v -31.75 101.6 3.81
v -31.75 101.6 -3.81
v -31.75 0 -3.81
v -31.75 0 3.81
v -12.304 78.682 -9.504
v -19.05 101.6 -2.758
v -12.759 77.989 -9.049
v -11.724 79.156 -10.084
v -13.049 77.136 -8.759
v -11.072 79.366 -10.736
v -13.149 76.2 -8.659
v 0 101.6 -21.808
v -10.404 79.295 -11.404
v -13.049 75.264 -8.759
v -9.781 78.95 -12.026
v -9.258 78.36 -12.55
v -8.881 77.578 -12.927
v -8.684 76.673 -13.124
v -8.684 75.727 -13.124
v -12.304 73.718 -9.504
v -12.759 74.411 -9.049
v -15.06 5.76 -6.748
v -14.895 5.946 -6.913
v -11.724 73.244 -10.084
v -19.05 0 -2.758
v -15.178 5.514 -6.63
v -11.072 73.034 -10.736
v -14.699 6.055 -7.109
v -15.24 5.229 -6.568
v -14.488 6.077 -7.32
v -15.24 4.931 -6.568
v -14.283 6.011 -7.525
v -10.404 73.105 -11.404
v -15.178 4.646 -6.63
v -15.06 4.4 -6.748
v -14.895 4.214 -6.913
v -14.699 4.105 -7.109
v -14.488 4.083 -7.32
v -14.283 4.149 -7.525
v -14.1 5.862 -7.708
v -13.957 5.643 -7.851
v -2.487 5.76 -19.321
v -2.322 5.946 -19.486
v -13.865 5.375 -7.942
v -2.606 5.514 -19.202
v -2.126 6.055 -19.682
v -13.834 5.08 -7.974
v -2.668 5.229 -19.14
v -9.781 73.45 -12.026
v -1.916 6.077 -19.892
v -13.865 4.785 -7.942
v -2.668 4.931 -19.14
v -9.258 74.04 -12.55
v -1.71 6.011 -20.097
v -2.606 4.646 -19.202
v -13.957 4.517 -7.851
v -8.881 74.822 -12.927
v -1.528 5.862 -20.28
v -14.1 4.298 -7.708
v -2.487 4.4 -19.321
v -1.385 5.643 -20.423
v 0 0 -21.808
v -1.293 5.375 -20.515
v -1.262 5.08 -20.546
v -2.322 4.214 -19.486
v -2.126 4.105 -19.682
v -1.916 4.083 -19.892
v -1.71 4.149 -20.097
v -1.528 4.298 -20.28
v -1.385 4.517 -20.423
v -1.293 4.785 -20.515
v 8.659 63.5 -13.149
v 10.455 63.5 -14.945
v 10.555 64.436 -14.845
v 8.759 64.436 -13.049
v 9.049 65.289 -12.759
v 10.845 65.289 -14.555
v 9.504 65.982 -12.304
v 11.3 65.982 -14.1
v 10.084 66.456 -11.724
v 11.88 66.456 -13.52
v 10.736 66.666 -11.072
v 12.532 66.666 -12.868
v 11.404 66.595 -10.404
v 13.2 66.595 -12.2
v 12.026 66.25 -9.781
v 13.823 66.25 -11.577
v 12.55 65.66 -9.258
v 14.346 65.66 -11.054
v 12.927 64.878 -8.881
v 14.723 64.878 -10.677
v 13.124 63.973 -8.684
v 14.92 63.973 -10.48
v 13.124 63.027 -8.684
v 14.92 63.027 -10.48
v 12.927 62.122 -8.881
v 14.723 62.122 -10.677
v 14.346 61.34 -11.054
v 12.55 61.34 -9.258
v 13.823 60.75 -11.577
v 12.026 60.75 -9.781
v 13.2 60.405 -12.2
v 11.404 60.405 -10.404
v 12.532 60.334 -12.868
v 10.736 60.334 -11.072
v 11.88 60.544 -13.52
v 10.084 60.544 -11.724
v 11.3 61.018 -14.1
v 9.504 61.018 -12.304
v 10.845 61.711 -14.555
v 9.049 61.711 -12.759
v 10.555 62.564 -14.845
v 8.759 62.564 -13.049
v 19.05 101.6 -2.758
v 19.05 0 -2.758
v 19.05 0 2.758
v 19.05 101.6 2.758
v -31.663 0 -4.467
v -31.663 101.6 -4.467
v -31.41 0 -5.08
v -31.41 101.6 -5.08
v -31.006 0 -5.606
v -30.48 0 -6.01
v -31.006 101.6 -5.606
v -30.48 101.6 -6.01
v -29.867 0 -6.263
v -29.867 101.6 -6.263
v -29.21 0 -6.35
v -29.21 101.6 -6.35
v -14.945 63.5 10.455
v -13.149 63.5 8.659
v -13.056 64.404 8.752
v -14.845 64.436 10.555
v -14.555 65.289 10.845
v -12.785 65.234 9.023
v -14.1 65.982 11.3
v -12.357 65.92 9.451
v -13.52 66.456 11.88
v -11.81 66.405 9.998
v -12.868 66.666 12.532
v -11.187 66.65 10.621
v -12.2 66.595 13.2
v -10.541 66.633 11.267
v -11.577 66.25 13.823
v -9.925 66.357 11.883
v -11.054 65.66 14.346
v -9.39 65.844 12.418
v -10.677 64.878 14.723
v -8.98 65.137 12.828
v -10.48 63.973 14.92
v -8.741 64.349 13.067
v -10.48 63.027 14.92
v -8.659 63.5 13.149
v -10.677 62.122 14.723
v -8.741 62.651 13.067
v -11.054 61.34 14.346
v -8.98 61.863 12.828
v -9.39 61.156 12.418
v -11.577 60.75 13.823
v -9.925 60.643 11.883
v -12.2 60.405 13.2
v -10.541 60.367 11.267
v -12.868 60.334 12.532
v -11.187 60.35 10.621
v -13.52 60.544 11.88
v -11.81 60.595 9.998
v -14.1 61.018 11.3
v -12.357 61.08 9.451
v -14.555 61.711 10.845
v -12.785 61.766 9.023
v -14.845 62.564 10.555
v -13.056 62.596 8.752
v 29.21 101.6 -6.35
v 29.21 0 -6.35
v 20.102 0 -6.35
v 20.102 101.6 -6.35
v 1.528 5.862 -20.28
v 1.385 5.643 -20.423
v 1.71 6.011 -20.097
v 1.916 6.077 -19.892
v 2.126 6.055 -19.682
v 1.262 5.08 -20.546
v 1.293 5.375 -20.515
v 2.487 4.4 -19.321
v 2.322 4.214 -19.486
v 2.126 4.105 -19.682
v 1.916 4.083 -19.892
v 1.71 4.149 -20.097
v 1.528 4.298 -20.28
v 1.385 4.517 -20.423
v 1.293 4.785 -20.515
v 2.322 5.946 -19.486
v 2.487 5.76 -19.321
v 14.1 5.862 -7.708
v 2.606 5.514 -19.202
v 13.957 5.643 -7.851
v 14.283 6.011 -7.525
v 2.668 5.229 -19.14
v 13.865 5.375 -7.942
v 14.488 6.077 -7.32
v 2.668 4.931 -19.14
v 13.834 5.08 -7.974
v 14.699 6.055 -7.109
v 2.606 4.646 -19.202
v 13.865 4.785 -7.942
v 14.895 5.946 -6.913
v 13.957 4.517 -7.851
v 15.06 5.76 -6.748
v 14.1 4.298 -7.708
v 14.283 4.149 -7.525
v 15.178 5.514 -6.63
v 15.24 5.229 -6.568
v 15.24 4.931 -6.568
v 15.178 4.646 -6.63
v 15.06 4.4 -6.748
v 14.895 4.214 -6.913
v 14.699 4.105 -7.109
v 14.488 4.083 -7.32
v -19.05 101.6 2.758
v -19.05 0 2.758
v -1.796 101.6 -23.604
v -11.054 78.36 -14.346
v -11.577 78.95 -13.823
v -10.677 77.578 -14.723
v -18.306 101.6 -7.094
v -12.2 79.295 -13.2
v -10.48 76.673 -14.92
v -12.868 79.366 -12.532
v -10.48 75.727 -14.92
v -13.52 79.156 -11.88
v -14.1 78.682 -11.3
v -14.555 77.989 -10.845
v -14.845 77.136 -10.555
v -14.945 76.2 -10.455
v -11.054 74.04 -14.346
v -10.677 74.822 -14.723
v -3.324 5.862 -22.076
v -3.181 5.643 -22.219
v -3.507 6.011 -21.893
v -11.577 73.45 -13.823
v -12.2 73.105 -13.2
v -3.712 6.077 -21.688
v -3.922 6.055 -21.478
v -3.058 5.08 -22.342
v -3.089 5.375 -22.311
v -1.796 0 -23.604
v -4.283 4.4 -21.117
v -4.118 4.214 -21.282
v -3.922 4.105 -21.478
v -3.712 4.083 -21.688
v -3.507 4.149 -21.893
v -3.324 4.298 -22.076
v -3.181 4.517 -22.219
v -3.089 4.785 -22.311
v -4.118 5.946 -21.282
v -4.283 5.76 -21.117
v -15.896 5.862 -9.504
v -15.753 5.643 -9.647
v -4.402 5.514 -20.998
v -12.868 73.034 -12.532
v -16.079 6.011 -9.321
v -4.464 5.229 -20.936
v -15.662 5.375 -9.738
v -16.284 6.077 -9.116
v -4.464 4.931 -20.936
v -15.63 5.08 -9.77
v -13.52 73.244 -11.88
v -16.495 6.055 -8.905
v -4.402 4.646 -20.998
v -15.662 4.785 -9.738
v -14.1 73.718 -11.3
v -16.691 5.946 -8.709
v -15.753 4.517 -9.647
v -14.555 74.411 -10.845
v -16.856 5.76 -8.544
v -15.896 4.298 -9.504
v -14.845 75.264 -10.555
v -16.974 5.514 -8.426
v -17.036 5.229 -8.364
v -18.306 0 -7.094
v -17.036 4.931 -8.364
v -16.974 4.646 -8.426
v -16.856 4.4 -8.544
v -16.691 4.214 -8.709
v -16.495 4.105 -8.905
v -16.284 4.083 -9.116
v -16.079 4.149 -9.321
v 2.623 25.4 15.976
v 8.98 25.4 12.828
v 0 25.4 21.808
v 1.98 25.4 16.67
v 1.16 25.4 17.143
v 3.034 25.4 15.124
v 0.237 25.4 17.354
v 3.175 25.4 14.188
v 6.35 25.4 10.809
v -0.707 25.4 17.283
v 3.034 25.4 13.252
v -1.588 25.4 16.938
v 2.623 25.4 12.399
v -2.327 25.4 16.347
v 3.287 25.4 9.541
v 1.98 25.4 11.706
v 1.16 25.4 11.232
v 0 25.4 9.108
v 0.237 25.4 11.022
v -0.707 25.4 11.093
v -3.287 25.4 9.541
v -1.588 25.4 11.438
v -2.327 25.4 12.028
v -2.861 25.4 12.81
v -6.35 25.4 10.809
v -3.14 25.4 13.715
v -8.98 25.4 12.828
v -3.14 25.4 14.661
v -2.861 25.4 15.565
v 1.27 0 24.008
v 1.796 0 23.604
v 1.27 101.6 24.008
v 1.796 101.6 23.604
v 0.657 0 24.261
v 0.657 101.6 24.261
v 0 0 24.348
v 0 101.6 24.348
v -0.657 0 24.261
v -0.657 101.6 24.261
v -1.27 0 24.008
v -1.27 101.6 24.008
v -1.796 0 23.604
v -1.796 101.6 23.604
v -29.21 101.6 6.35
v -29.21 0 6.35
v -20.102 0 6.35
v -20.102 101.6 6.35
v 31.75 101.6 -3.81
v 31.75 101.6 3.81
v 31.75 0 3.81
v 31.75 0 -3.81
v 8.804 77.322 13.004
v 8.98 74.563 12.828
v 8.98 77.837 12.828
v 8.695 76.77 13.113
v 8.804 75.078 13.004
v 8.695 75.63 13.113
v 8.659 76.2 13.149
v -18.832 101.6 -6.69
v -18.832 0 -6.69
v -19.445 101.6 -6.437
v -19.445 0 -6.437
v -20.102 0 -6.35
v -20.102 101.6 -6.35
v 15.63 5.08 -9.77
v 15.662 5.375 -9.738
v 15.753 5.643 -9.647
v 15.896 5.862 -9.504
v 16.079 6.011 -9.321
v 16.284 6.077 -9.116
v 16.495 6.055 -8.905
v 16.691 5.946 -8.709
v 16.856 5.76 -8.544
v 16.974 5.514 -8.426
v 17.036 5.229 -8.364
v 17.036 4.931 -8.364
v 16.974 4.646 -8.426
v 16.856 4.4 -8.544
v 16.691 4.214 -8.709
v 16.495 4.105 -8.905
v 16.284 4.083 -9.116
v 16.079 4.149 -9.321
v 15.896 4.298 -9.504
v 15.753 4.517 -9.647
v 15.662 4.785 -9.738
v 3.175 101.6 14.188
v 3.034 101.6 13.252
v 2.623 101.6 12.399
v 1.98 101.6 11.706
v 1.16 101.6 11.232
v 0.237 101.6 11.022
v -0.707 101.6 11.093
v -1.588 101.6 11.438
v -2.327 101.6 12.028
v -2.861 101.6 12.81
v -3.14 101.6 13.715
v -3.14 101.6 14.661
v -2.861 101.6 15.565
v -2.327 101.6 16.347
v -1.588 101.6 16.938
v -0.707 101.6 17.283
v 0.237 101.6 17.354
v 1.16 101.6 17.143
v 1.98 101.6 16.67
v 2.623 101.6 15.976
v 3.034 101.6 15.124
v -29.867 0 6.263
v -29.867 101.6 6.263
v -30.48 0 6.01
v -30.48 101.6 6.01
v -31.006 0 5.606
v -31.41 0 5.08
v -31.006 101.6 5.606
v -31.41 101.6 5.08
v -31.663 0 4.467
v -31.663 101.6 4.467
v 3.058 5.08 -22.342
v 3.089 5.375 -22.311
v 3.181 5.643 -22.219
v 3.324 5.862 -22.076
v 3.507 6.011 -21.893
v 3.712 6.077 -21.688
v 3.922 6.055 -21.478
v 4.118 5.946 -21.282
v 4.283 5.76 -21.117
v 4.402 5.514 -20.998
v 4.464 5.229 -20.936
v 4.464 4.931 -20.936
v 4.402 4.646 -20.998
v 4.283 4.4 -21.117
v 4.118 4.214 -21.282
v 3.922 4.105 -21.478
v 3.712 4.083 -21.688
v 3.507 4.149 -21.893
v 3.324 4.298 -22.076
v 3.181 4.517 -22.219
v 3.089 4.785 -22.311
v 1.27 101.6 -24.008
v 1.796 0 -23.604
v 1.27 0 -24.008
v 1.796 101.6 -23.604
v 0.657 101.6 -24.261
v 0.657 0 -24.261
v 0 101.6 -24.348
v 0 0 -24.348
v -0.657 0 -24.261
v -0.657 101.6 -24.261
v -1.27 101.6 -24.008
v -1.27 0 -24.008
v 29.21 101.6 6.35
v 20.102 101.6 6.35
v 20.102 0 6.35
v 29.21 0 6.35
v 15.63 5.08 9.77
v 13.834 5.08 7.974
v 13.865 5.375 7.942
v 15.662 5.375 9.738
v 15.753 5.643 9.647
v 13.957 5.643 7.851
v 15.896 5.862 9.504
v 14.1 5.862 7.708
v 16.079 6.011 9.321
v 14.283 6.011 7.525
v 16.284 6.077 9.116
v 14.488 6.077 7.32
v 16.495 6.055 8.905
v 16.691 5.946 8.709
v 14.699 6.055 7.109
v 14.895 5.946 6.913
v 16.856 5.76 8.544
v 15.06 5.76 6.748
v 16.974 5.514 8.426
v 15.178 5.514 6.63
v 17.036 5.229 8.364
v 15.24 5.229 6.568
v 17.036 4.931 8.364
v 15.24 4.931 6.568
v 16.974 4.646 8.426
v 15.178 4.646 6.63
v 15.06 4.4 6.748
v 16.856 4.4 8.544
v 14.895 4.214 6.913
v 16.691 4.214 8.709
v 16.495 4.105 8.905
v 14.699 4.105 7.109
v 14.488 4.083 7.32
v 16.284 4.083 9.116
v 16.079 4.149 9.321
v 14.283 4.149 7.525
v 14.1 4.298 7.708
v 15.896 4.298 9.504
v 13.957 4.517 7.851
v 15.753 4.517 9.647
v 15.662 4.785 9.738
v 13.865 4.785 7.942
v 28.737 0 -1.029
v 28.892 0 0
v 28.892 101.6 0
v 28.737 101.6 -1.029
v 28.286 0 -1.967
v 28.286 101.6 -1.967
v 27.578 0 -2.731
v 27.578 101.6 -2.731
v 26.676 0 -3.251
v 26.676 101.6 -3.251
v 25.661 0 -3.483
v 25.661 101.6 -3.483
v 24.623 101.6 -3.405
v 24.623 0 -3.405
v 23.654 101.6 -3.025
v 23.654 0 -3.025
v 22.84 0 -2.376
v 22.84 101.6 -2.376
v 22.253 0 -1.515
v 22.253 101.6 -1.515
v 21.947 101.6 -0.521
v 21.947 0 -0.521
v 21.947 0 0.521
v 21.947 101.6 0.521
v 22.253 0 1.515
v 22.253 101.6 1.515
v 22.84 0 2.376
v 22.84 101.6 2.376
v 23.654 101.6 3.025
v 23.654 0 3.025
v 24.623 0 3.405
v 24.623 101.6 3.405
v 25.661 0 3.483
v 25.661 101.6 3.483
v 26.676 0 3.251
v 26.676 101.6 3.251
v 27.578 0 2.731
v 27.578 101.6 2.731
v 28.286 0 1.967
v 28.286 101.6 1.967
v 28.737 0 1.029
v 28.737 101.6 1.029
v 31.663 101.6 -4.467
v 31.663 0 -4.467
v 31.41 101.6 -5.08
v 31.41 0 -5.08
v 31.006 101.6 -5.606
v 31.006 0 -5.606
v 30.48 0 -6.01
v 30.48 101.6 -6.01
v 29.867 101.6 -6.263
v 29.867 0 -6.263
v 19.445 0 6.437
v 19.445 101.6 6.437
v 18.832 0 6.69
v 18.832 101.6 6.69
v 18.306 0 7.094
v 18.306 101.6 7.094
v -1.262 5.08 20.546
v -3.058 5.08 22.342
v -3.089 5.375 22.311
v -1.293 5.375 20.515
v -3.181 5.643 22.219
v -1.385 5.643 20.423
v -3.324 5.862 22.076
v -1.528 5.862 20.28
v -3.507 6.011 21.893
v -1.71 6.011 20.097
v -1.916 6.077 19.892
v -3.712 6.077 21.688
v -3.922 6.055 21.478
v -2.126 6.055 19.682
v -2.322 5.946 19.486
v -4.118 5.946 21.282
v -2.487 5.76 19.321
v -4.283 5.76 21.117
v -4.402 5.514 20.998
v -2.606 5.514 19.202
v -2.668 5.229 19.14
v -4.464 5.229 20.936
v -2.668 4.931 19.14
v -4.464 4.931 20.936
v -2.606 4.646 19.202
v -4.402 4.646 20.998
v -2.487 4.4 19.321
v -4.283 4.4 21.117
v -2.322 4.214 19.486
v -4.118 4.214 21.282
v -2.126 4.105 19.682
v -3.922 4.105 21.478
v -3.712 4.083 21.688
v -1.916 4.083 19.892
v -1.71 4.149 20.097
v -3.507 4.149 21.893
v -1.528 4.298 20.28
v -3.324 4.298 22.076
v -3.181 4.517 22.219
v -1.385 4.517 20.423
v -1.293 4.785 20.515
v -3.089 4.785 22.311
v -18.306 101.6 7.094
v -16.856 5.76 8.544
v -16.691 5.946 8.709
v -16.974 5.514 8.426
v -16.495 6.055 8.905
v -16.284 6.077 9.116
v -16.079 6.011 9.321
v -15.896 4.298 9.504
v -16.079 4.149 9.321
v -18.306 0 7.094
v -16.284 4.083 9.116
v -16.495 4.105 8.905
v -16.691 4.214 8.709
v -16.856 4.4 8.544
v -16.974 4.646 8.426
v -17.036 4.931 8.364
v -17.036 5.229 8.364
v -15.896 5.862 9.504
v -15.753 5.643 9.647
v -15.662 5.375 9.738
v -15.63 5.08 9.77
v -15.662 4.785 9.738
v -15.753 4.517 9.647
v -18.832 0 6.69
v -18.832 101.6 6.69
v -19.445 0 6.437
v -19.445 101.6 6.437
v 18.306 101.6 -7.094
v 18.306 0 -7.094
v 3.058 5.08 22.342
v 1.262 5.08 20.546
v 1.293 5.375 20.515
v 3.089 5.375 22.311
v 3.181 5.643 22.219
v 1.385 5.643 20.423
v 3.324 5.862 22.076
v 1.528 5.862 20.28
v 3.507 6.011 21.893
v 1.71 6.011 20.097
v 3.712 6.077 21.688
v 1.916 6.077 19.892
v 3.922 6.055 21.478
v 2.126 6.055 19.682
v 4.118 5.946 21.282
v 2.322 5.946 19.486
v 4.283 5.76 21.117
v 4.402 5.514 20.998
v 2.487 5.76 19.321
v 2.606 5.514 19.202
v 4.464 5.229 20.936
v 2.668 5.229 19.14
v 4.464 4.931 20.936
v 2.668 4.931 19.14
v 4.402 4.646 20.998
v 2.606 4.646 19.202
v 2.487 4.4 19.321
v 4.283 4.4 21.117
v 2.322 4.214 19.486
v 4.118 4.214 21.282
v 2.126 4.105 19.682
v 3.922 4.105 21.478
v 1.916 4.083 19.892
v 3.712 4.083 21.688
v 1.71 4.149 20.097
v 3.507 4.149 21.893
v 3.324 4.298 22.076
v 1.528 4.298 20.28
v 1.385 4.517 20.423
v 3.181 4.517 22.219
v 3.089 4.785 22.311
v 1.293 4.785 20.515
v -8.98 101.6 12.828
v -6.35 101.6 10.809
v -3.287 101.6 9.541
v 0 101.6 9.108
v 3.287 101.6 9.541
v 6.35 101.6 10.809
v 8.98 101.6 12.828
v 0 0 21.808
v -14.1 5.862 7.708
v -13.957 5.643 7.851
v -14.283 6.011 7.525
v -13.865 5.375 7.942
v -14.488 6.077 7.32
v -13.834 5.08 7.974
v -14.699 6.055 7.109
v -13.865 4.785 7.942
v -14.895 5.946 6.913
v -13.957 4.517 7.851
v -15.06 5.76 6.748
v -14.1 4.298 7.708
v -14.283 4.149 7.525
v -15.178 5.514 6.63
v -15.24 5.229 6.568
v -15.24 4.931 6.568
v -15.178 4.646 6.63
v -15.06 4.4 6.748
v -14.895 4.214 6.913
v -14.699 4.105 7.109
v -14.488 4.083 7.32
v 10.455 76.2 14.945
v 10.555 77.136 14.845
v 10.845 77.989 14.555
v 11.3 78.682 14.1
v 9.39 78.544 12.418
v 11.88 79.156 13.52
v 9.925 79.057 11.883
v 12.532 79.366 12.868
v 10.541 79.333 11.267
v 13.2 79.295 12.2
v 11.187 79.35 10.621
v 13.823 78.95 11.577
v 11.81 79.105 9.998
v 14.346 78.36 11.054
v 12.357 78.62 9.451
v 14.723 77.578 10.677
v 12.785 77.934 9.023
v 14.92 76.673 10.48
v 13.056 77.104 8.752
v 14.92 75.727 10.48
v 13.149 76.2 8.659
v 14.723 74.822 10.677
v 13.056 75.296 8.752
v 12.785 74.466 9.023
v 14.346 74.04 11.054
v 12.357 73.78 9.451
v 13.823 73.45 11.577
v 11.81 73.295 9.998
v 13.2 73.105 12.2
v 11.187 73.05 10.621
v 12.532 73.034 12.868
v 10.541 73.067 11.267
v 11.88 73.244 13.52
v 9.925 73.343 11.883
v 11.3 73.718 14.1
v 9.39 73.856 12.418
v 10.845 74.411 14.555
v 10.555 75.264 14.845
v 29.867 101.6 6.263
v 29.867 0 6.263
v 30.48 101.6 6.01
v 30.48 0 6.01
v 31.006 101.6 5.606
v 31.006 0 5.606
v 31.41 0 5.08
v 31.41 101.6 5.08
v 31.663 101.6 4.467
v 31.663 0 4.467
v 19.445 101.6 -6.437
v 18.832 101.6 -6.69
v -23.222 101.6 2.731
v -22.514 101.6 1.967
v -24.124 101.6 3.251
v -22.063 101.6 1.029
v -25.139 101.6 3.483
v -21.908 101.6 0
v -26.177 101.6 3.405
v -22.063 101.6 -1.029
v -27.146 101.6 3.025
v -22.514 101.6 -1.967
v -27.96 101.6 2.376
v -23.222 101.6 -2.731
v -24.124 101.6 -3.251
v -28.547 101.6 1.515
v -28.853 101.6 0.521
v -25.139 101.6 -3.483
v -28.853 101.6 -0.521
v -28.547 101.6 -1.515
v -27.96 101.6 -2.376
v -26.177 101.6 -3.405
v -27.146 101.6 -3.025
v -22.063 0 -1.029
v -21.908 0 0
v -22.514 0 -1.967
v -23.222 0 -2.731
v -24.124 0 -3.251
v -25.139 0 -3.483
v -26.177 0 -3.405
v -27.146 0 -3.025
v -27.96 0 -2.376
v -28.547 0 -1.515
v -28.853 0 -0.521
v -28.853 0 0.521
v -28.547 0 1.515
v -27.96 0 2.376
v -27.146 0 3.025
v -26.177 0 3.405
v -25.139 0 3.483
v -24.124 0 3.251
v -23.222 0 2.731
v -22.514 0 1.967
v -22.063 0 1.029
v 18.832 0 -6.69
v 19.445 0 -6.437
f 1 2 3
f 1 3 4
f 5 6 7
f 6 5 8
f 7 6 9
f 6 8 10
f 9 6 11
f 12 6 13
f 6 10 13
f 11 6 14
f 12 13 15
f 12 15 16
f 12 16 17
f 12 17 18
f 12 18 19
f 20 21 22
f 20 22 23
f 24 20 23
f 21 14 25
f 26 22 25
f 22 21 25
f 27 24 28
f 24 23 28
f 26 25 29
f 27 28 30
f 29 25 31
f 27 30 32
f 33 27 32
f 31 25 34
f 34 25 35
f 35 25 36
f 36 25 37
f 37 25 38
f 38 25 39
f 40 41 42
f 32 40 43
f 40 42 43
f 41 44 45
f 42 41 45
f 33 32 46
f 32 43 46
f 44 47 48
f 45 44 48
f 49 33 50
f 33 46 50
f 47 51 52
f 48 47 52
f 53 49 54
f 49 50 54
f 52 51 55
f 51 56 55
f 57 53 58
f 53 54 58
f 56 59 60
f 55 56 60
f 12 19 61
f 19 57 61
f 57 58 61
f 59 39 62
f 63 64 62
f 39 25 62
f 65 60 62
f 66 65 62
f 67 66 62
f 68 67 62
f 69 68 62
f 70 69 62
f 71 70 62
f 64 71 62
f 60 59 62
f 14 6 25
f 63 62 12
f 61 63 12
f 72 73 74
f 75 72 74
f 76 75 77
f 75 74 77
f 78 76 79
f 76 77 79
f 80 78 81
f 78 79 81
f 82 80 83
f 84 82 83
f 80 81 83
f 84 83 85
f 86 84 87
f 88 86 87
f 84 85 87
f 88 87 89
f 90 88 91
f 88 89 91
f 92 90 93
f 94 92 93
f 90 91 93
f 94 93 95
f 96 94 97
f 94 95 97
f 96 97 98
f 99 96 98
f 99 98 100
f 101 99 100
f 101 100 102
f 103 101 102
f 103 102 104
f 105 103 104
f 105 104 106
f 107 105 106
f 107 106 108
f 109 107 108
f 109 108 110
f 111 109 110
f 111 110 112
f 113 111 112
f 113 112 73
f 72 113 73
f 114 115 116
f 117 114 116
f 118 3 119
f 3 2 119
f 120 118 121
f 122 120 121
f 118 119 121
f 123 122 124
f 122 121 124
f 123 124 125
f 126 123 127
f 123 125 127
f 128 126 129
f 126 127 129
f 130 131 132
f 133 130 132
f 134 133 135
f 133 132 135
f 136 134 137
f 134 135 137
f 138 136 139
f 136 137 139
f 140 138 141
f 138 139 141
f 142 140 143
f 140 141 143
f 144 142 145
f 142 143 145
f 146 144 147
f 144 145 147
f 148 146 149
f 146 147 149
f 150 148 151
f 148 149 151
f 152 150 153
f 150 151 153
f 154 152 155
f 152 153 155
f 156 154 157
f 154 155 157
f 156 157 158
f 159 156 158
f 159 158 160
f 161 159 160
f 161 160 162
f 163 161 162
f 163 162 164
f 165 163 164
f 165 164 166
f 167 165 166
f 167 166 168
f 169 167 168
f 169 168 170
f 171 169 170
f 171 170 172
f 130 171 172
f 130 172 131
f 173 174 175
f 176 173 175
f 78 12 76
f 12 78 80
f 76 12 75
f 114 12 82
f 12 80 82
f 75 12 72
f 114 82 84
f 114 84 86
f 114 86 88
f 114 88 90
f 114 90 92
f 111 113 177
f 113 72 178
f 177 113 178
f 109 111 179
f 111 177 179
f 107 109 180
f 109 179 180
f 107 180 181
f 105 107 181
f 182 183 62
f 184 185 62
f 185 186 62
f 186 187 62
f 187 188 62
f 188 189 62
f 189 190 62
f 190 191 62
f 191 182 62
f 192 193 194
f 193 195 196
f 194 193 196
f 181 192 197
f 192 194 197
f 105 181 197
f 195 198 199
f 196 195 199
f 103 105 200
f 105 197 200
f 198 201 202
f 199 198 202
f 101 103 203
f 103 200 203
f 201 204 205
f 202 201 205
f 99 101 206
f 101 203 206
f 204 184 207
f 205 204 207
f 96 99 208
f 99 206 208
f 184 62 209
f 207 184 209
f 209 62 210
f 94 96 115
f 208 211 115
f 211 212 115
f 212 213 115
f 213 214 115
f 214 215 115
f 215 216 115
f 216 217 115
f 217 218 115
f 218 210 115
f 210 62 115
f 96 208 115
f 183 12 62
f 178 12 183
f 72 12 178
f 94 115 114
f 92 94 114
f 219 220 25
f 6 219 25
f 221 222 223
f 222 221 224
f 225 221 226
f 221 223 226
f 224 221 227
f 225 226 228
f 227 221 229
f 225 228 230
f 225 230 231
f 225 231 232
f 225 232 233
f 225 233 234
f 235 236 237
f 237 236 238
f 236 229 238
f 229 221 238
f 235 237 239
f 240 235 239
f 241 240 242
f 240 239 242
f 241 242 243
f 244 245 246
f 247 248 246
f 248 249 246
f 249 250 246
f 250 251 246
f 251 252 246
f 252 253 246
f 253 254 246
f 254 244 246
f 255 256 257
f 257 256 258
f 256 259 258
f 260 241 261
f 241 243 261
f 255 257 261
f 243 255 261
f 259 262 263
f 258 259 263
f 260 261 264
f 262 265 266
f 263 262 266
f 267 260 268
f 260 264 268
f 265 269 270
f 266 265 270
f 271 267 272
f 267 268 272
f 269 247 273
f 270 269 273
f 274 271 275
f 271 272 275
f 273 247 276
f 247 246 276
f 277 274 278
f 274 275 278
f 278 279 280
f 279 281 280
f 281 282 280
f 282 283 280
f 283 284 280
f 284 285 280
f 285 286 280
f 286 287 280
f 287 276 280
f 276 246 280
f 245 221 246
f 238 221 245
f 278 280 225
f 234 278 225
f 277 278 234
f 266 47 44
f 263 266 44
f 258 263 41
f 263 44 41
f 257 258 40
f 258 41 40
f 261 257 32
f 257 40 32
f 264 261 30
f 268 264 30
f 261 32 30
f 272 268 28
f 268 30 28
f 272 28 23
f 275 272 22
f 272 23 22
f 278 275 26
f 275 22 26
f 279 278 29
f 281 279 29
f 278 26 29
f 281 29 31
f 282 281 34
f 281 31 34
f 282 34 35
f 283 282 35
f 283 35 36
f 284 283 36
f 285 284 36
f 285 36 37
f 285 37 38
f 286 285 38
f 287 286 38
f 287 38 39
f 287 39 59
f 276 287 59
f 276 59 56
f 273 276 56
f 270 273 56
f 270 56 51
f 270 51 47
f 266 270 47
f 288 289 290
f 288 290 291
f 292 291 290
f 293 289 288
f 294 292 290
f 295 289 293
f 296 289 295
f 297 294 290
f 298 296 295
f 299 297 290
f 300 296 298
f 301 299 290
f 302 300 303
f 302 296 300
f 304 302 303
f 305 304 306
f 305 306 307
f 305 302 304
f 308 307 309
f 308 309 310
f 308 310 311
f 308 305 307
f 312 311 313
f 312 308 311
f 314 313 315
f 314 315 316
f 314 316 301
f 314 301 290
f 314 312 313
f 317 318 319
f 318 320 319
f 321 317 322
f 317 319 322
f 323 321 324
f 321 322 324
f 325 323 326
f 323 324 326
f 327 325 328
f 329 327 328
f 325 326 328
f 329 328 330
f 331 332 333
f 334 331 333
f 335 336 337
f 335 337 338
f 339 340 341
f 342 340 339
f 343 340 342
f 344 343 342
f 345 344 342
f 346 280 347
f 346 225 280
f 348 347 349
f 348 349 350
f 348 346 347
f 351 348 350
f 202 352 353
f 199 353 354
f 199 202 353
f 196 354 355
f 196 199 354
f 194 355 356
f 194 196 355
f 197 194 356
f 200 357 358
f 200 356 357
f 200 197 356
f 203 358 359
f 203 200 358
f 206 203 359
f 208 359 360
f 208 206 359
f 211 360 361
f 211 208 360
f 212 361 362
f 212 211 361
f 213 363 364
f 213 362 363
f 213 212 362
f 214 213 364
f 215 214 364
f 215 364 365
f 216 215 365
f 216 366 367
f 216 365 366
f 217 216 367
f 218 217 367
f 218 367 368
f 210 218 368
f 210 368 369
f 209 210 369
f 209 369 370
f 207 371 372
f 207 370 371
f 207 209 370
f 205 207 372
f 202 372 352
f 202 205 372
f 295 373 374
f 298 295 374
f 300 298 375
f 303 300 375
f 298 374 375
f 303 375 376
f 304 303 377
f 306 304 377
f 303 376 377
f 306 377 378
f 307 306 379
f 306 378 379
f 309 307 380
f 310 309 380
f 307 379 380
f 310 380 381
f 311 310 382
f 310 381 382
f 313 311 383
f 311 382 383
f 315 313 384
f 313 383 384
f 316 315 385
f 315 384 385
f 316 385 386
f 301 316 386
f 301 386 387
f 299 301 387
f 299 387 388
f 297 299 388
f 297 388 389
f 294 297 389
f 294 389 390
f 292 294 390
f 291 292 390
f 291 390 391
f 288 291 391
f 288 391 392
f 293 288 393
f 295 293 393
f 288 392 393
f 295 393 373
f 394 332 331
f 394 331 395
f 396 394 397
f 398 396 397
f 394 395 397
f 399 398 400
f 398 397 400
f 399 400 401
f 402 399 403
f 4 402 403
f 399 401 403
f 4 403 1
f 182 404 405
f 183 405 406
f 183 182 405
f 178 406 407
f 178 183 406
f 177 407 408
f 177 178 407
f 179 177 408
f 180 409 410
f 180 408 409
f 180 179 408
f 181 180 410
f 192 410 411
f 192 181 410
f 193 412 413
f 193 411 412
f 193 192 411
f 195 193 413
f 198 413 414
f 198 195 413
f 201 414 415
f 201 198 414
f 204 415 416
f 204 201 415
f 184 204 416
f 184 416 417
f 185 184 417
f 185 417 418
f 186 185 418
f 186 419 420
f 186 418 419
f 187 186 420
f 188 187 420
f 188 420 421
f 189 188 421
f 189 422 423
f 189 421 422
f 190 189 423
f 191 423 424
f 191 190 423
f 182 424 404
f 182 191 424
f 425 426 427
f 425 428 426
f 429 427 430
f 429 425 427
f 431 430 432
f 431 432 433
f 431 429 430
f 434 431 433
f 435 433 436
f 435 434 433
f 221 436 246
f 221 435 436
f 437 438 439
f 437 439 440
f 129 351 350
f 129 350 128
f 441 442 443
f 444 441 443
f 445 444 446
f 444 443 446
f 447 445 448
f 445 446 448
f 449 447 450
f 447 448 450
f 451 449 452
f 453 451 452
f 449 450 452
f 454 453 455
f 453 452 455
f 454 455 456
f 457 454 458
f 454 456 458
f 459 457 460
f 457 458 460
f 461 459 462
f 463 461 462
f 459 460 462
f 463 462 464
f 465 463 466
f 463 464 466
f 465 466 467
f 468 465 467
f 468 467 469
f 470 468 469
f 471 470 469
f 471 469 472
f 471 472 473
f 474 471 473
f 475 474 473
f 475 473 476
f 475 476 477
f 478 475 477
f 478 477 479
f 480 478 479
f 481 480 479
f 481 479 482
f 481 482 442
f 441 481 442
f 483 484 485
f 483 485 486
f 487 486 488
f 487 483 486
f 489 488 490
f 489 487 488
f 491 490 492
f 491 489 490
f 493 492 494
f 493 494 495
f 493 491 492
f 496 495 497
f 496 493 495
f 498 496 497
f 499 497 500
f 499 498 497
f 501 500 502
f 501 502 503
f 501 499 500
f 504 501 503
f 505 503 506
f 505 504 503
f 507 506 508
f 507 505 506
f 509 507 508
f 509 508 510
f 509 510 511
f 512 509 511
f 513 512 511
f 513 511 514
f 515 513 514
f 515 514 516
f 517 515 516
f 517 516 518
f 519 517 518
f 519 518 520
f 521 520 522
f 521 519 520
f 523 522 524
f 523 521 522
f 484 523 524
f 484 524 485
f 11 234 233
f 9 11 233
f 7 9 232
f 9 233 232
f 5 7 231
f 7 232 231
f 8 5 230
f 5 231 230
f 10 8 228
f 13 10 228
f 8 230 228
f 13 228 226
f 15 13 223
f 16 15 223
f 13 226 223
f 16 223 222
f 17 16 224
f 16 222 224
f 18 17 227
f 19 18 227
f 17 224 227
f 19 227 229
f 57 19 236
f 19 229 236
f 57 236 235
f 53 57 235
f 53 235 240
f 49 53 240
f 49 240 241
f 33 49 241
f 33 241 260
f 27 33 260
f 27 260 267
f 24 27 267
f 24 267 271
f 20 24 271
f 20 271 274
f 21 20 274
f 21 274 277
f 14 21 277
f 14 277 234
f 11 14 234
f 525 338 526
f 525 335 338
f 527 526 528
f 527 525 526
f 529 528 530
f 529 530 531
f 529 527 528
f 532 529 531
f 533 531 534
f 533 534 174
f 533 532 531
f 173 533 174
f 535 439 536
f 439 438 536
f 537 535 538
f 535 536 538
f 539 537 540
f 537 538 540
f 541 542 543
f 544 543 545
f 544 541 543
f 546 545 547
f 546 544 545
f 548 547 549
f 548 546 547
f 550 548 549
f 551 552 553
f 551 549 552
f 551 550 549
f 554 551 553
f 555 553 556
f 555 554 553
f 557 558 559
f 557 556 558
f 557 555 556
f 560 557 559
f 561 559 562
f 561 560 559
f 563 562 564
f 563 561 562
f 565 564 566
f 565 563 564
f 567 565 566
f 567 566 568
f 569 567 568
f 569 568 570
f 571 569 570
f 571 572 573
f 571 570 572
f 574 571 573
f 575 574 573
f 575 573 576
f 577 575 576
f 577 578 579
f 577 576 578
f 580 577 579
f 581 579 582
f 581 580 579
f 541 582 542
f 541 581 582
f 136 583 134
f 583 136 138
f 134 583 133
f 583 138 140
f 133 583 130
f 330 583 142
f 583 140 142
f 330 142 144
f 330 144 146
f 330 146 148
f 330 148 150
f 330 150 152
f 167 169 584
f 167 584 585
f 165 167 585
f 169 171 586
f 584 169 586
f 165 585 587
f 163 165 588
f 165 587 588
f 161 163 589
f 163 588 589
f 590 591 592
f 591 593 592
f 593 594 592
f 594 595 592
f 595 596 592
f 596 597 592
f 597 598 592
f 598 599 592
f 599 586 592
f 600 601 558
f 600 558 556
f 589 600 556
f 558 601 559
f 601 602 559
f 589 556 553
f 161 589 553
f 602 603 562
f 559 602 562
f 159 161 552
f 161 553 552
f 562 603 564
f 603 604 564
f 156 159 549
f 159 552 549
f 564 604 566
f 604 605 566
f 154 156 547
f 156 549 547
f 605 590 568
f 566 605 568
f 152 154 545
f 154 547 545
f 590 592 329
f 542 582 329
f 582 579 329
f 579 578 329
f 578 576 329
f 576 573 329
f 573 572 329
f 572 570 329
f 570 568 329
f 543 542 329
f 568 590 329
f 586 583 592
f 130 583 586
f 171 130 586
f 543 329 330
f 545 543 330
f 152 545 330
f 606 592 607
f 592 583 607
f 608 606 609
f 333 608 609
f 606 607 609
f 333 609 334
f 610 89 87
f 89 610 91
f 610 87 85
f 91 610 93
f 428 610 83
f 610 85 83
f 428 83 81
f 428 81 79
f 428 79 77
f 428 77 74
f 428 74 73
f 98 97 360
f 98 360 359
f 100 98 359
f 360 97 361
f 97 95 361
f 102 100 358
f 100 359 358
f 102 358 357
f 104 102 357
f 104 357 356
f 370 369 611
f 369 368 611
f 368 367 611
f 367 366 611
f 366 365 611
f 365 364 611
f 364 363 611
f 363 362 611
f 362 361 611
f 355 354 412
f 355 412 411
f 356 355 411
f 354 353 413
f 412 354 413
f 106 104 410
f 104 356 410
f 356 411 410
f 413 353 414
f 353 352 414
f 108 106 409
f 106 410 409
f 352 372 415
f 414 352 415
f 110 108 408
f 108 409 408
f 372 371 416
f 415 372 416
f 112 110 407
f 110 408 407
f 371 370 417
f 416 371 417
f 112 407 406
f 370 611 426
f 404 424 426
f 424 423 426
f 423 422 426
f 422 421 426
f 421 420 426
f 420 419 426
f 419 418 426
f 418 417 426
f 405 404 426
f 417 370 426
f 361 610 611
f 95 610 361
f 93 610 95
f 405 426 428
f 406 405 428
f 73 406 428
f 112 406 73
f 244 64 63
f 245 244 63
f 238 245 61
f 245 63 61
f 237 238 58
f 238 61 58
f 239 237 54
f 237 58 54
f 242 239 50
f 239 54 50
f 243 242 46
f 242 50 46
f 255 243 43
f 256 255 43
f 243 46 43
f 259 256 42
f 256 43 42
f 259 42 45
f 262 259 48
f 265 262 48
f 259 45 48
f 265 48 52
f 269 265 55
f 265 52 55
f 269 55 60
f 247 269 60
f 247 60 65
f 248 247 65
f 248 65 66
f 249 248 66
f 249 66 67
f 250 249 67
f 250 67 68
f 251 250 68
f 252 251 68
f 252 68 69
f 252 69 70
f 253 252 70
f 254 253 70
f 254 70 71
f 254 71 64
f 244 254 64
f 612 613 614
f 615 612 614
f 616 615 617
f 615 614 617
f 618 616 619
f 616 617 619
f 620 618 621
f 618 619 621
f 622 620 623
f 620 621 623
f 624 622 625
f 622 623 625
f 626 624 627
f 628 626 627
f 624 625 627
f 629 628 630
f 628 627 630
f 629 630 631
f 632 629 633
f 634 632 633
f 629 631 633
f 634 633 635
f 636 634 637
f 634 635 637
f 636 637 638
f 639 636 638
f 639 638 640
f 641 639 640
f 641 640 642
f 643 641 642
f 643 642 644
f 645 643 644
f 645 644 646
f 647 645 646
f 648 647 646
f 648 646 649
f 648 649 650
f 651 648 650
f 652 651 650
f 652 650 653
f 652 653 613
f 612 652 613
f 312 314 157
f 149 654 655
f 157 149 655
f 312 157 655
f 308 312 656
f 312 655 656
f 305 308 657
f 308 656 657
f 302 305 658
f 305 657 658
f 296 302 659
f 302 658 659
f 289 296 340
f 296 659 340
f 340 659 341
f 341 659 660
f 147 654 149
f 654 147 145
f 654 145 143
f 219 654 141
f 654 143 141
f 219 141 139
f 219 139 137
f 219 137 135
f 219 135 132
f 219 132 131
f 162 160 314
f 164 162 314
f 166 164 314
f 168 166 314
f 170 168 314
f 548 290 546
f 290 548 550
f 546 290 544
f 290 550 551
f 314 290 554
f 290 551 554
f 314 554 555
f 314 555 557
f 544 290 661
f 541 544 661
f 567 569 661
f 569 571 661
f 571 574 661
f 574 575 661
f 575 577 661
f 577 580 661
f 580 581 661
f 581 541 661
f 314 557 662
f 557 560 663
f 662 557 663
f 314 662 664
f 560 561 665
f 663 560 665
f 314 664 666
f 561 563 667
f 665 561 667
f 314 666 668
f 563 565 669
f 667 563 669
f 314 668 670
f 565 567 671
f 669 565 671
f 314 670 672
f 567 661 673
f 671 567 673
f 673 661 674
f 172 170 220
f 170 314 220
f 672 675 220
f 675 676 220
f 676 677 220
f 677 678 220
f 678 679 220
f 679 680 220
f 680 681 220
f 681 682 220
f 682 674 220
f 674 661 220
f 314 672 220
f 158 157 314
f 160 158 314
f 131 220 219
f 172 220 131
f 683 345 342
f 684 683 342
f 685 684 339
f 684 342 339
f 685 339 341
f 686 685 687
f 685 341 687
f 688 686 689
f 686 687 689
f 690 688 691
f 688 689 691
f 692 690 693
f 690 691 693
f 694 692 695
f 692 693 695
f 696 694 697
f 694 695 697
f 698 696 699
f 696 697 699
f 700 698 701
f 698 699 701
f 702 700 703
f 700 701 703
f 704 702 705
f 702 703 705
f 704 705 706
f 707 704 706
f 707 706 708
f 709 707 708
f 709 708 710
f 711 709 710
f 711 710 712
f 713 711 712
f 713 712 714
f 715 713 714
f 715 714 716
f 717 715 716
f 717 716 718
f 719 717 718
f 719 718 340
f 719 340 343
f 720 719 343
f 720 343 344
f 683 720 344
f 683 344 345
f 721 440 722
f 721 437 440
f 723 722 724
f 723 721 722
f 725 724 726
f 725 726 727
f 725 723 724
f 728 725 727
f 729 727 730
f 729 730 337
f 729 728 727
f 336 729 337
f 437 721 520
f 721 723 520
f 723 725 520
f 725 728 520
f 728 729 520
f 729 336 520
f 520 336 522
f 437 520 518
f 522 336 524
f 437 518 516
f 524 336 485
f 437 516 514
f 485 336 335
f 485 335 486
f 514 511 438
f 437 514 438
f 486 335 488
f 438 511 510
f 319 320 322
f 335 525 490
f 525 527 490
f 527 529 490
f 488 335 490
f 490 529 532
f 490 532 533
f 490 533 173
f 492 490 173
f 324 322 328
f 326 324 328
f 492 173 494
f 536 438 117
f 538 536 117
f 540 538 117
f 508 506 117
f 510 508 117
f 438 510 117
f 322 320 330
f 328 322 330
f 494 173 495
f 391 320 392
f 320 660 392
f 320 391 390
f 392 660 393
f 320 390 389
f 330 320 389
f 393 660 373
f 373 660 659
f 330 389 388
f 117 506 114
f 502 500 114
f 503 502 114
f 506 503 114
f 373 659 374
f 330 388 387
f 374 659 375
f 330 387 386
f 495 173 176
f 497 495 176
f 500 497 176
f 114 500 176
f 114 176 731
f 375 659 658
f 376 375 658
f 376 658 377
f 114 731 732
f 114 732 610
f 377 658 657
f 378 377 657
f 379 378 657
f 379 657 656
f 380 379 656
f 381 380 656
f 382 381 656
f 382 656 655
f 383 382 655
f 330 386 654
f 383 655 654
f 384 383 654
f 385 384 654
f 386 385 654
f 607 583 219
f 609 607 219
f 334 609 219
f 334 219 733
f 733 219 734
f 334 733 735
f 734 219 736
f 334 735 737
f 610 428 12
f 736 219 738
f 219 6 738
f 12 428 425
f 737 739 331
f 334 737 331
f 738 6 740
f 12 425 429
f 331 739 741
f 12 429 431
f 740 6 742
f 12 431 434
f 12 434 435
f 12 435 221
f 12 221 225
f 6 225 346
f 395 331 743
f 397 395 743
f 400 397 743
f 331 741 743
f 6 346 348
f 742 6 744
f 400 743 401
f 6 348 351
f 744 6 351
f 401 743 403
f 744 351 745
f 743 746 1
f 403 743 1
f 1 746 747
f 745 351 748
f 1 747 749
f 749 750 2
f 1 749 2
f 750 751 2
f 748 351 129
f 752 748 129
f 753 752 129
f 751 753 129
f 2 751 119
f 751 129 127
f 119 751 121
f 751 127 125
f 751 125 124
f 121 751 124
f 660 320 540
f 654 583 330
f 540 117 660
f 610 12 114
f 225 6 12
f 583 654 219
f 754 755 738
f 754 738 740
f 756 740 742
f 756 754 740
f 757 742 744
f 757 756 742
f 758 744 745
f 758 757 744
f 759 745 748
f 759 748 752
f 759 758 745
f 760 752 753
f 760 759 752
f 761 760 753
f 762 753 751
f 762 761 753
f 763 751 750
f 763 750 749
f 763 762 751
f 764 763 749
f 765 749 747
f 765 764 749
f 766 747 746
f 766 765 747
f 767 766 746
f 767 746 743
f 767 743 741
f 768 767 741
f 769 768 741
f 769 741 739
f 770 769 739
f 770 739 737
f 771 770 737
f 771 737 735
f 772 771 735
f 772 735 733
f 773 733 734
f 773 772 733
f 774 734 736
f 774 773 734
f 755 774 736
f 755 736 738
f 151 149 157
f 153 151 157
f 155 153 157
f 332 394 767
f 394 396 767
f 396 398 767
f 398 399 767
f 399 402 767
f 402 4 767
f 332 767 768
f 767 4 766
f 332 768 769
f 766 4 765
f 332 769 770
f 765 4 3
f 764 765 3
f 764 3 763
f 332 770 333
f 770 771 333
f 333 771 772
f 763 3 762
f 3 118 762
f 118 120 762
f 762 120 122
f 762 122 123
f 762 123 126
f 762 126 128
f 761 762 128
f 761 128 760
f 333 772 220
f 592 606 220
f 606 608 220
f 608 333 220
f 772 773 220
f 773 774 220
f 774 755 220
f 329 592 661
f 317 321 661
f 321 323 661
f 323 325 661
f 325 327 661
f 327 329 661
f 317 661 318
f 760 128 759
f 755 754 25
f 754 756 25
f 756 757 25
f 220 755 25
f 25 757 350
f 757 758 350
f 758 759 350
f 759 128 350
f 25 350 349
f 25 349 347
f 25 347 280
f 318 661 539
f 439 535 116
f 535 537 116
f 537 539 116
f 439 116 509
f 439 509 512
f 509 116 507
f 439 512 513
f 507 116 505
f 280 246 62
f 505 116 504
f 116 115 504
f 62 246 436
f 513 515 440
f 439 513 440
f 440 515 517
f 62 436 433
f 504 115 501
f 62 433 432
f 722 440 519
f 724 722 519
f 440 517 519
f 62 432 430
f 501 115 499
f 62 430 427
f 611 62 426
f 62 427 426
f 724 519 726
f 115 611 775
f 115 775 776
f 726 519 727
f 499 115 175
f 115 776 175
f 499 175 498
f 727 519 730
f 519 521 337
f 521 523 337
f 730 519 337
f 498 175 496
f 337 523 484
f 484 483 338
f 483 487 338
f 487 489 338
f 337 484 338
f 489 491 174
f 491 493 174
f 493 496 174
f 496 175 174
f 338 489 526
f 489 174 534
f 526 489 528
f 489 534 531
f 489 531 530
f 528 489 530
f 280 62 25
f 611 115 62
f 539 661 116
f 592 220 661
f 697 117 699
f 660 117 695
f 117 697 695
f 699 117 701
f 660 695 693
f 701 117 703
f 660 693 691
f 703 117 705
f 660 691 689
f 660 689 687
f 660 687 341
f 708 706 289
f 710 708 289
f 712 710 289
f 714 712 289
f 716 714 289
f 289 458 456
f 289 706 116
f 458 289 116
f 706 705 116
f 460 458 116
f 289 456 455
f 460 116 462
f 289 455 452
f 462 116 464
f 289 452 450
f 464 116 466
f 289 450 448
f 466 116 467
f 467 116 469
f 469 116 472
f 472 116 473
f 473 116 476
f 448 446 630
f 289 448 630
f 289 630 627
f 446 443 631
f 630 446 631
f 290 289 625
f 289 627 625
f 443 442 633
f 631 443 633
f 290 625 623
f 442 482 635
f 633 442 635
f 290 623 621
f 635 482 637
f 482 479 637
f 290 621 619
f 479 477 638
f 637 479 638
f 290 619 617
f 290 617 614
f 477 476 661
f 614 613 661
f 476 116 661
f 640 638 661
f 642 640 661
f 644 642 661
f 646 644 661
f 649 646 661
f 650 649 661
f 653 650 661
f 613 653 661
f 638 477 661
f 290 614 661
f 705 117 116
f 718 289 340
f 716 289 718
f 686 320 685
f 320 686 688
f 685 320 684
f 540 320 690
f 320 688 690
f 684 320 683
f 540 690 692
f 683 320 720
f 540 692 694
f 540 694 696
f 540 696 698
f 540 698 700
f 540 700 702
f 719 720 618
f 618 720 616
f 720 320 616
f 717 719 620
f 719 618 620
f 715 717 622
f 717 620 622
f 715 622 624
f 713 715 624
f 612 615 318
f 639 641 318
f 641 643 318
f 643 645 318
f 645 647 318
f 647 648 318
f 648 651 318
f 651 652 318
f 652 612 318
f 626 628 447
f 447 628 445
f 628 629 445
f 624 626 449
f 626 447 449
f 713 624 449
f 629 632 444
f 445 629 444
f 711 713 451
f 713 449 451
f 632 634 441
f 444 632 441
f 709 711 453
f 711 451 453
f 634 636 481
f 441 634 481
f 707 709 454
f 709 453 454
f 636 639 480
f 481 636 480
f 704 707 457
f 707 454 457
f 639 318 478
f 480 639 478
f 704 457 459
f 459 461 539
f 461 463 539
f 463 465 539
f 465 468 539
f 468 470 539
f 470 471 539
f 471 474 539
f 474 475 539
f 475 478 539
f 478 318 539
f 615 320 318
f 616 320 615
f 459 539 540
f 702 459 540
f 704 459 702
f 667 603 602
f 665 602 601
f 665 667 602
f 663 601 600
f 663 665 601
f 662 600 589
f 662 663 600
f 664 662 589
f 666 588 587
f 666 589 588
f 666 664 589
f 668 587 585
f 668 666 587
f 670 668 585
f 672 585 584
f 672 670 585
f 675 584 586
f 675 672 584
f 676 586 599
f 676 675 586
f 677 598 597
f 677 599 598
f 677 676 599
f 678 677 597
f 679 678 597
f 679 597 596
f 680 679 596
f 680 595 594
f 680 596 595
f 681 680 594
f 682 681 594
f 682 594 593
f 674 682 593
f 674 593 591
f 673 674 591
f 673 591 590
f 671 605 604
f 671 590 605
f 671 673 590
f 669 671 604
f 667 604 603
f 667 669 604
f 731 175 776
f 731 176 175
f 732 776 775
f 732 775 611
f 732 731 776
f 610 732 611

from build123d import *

# Parameters (mm, degrees)
SKETCH2_R               = 3.4925
BOSS_EXTRUDE1_DEPTH     = 101.6
FILLET1_R               = 2.54
CUT_EXTRUDE1_START      = -2.54
SKETCH11_R              = 1
CUT_EXTRUDE1_DEPTH      = 25.246691527
MIRROR3_START           = -2.54
MIRROR3_COPY_1_SKETCH_R = 1
MIRROR3_COPY_1_DEPTH    = 25.246691527
SKETCH12_R              = 3.175
CUT_EXTRUDE2_DEPTH      = 22.706691527
CUT_EXTRUDE2_DEPTH_BACK = 58.627716011
SKETCH13_R              = 3.175
CUT_EXTRUDE3_DEPTH      = 22.706691527
CUT_EXTRUDE3_DEPTH_BACK = 58.627716011
SKETCH14_R              = 3.175
BOSS_EXTRUDE2_DEPTH     = 76.2


with BuildPart() as part:
    # Sketch2 → Boss-Extrude1 (new body)
    with BuildSketch(Plane(origin=(0, 0, 0), x_dir=(1, 0, 0), z_dir=(0, 1, 0))):
        Polygon((19.05, -6.35), (31.75, -6.35), (31.75, 6.35), (19.05, 6.35), (0, 25.4), (-19.05, 6.35), (-31.75, 6.35), (-31.75, -6.35), (-19.05, -6.35), (0, -25.4), align=None)
        Polygon((-19.05, 2.757897552), (0, 21.807897552), (19.05, 2.757897552), (19.05, -2.757897552), (0, -21.807897552), (-19.05, -2.757897552), align=None, mode=Mode.SUBTRACT)
        with Locations((25.4, 0)):
            Circle(SKETCH2_R, mode=Mode.SUBTRACT)
        with Locations((-25.4, 0)):
            Circle(SKETCH2_R, mode=Mode.SUBTRACT)
    extrude(amount=BOSS_EXTRUDE1_DEPTH)

    # Fillet1
    fillet1_edges = [part.edges().sort_by_distance(p)[0] for p in [
        (0, 50.8, 25.4),
        (-19.05, 50.8, 6.35),
        (-31.75, 50.8, 6.35),
        (-31.75, 50.8, -6.35),
        (-19.05, 50.8, -6.35),
        (0, 50.8, -25.4),
        (19.05, 50.8, -6.35),
        (31.75, 50.8, -6.35),
        (31.75, 50.8, 6.35),
        (19.05, 50.8, 6.35),
    ]]
    fillet(fillet1_edges, radius=FILLET1_R)

    # Sketch11 → Cut-Extrude1 (cut)
    with BuildSketch(Plane(origin=(12.7, 0, -12.7), x_dir=(-0.707106781, 0, -0.707106781), z_dir=(0.707106781, 0, -0.707106781)).offset(CUT_EXTRUDE1_START)):
        with Locations((-5.143820715, 5.08)):
            Circle(SKETCH11_R)
        with Locations((12.636179285, 5.08)):
            Circle(SKETCH11_R)
    cut_extrude1 = extrude(amount=CUT_EXTRUDE1_DEPTH, mode=Mode.SUBTRACT)

    # Mirror2: Cut-Extrude1 across plane
    add(cut_extrude1.mirror(Plane(origin=(0, 0, 0), x_dir=(0, 0, 1), z_dir=(1, 0, 0))), mode=Mode.SUBTRACT)

    # Mirror3: Cut-Extrude1 across plane
    add(cut_extrude1.mirror(Plane.XY), mode=Mode.SUBTRACT)

    # Mirror3 copy 1 sketch → Mirror3 copy 1 (cut)
    with BuildSketch(Plane(origin=(-12.7, 0, 12.7), x_dir=(0.707106781, 0, 0.707106781), z_dir=(-0.707106781, 0, 0.707106781)).offset(MIRROR3_START)):
        with Locations((-5.143820715, 5.08)):
            Circle(MIRROR3_COPY_1_SKETCH_R)
        with Locations((12.636179285, 5.08)):
            Circle(MIRROR3_COPY_1_SKETCH_R)
    extrude(amount=MIRROR3_COPY_1_DEPTH, mode=Mode.SUBTRACT)

    # Sketch12 → Cut-Extrude2 (cut, two sides)
    with BuildSketch(Plane(origin=(-12.7, 0, -12.7), x_dir=(-0.707106781, 0, 0.707106781), z_dir=(-0.707106781, 0, -0.707106781))) as cut_extrude2_sk:
        with Locations((0, 76.2)):
            Circle(SKETCH12_R)
    extrude(amount=CUT_EXTRUDE2_DEPTH, mode=Mode.SUBTRACT)
    extrude(cut_extrude2_sk.sketch, amount=-CUT_EXTRUDE2_DEPTH_BACK, mode=Mode.SUBTRACT)

    # Sketch13 → Cut-Extrude3 (cut, two sides)
    with BuildSketch(Plane(origin=(12.7, 0, -12.7), x_dir=(-0.707106781, 0, -0.707106781), z_dir=(0.707106781, 0, -0.707106781))) as cut_extrude3_sk:
        with Locations((0, 63.5)):
            Circle(SKETCH13_R)
    extrude(amount=CUT_EXTRUDE3_DEPTH, mode=Mode.SUBTRACT)
    extrude(cut_extrude3_sk.sketch, amount=-CUT_EXTRUDE3_DEPTH_BACK, mode=Mode.SUBTRACT)

    # Sketch14 → Boss-Extrude2 (add)
    with BuildSketch(Plane(origin=(0, 101.6, 0), x_dir=(1, 0, 0), z_dir=(0, 1, 0))):
        with BuildLine():
            Line((8.980256121, -12.827641431), (0, -21.807897552))
            Line((0, -21.807897552), (-8.980256121, -12.827641431))
            ThreePointArc((-8.980256121, -12.827641431), (0, -9.107897552), (8.980256121, -12.827641431))
        make_face()
        with Locations((0, -14.187897552)):
            Circle(SKETCH14_R, mode=Mode.SUBTRACT)
    extrude(amount=-BOSS_EXTRUDE2_DEPTH)


solid = part.part
